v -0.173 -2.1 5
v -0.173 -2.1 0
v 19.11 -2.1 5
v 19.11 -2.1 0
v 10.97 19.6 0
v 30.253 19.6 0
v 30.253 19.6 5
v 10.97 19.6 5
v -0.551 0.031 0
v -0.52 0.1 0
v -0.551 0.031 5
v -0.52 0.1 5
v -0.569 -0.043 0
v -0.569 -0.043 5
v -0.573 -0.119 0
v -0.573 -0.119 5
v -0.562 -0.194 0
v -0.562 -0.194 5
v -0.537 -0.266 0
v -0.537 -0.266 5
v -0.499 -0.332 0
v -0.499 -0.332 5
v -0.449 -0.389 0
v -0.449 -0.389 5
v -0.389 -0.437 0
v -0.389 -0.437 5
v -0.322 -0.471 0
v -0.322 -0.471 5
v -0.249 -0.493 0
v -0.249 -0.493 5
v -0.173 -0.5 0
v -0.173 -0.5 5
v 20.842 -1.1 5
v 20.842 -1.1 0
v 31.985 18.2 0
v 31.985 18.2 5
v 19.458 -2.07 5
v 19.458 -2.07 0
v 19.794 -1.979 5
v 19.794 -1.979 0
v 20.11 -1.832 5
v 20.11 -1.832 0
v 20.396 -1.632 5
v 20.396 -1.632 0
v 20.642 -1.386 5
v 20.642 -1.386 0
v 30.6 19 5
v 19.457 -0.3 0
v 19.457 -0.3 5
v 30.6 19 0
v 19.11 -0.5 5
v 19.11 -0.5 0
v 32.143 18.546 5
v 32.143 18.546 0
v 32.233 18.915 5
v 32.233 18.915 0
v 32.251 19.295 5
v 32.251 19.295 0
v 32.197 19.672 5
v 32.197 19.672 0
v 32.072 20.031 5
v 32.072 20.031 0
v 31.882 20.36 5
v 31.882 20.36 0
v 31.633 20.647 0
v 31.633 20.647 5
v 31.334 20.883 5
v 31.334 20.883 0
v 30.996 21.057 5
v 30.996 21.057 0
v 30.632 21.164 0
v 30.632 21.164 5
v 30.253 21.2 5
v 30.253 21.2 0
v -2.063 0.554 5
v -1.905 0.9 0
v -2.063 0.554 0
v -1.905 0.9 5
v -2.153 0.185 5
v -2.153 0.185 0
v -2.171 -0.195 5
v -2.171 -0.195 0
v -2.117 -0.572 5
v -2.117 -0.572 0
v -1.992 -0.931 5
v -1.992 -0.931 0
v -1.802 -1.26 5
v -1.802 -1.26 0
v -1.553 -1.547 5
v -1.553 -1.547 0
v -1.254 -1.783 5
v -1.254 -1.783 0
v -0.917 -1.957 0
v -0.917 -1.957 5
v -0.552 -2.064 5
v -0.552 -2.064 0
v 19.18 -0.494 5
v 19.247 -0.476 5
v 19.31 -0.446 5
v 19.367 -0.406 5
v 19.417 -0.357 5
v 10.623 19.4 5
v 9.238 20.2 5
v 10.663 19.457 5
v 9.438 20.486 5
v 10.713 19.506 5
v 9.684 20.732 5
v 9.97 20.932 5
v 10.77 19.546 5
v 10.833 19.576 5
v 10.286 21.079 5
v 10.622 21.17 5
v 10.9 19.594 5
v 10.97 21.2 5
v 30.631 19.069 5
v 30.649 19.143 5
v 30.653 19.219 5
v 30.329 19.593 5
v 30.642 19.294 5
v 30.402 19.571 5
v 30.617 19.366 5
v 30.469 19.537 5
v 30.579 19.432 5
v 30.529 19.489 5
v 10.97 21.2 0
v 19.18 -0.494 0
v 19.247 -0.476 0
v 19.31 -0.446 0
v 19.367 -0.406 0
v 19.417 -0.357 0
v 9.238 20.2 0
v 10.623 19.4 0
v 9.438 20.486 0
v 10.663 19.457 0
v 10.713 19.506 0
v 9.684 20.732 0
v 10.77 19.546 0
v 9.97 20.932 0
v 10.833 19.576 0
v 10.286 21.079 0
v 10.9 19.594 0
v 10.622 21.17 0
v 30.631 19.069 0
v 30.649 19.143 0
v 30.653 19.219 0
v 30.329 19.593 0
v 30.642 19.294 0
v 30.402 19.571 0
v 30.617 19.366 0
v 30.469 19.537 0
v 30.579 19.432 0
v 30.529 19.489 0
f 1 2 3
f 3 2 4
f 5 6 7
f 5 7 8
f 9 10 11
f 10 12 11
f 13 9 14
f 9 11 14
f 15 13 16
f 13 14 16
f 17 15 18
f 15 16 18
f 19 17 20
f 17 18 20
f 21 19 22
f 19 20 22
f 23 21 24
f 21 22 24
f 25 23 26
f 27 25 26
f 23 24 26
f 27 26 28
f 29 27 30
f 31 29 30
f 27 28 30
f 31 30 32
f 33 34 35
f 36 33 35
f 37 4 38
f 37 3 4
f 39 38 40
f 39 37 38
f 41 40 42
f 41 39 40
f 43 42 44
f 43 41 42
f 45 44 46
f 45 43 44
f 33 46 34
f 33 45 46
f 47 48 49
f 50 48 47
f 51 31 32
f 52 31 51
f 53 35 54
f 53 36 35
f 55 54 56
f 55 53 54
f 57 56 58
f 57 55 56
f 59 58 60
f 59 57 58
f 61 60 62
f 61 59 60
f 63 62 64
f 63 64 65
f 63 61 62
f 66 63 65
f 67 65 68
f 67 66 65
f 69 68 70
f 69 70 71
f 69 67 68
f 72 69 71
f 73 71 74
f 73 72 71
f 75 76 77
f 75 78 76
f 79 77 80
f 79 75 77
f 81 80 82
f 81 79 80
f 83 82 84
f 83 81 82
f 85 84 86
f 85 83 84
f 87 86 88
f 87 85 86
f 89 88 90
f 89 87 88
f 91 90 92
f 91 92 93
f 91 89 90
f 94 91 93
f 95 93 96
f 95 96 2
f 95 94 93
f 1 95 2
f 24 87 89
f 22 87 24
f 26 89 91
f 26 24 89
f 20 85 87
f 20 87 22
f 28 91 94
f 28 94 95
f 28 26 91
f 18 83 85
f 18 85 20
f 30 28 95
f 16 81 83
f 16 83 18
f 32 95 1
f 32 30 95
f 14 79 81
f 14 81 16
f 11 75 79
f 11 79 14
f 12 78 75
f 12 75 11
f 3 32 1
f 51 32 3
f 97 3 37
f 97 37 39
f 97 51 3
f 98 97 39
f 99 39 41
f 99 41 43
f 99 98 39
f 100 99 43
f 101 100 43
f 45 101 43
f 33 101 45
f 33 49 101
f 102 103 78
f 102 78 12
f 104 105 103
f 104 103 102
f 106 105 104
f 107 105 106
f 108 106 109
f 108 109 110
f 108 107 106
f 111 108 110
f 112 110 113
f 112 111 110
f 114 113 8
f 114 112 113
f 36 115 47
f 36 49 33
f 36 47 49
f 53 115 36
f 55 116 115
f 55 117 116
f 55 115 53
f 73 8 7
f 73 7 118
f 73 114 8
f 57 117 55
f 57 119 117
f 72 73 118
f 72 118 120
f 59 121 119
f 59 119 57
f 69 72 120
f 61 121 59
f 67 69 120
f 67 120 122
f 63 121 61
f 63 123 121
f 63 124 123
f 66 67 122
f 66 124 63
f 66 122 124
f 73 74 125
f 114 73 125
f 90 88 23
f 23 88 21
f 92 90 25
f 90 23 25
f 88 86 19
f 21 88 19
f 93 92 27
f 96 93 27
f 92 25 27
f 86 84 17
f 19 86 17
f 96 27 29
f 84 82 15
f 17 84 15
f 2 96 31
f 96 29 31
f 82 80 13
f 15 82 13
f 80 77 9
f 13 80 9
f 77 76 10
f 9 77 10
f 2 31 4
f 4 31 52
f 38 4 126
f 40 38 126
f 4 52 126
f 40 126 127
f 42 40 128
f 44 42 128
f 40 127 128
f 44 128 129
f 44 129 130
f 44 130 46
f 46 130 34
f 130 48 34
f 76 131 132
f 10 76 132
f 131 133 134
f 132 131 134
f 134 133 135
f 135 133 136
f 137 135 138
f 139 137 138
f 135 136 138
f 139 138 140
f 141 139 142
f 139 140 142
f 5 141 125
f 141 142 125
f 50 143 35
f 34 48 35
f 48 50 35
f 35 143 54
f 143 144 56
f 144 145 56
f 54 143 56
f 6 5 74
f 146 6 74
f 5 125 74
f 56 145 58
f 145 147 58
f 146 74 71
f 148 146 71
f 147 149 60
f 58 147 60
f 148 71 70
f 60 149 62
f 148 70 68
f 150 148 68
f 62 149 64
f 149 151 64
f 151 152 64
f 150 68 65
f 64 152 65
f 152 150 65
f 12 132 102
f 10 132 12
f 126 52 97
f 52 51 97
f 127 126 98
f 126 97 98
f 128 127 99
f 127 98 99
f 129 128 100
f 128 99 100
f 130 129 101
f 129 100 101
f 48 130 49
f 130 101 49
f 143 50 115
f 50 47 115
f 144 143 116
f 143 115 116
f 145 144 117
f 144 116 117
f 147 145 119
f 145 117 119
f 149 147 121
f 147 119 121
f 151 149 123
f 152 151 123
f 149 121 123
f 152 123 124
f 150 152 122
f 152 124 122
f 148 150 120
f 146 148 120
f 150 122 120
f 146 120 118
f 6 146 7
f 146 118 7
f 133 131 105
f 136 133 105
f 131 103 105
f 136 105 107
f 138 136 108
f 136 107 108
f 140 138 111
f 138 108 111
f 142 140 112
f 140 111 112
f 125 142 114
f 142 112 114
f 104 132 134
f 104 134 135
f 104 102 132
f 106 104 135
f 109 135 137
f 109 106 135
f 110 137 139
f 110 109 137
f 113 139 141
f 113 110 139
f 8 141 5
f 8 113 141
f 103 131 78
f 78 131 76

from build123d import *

# Parameters (mm, degrees)
F1_DEPTH = 5
F2_R     = 2
F3_T     = -1.6


with BuildPart() as f1:
    # F0 (on Top) → F1 (new body)
    with BuildSketch(Plane.XY):
        Polygon((9.814955, 21.2), (-3.637307, -2.1), (20.264994, -2.1), (33.717256, 21.2), align=None)
        Polygon((19.052559, 0), (0, 0), (11.02739, 19.1), (30.079949, 19.1), align=None, mode=Mode.SUBTRACT)
        Polygon((11.02739, 19.1), (0, 0), (19.052559, 0), (30.079949, 19.1), align=None)
    extrude(amount=F1_DEPTH)

    # F2
    f2_edges = [f1.edges().sort_by_distance(p)[0] for p in [
        (-3.637307, -2.1, 2.5),
        (20.264994, -2.1, 2.5),
        (33.717256, 21.2, 2.5),
        (9.814955, 21.2, 2.5),
    ]]
    fillet(f2_edges, radius=F2_R)

    # F3
    f3_openings = [f1.faces().sort_by_distance(p)[0] for p in [
        (15.039975, 9.55, 5),
        (15.039975, 9.55, 0),
    ]]
    offset(amount=F3_T, openings=f3_openings)


solid = f1.part
